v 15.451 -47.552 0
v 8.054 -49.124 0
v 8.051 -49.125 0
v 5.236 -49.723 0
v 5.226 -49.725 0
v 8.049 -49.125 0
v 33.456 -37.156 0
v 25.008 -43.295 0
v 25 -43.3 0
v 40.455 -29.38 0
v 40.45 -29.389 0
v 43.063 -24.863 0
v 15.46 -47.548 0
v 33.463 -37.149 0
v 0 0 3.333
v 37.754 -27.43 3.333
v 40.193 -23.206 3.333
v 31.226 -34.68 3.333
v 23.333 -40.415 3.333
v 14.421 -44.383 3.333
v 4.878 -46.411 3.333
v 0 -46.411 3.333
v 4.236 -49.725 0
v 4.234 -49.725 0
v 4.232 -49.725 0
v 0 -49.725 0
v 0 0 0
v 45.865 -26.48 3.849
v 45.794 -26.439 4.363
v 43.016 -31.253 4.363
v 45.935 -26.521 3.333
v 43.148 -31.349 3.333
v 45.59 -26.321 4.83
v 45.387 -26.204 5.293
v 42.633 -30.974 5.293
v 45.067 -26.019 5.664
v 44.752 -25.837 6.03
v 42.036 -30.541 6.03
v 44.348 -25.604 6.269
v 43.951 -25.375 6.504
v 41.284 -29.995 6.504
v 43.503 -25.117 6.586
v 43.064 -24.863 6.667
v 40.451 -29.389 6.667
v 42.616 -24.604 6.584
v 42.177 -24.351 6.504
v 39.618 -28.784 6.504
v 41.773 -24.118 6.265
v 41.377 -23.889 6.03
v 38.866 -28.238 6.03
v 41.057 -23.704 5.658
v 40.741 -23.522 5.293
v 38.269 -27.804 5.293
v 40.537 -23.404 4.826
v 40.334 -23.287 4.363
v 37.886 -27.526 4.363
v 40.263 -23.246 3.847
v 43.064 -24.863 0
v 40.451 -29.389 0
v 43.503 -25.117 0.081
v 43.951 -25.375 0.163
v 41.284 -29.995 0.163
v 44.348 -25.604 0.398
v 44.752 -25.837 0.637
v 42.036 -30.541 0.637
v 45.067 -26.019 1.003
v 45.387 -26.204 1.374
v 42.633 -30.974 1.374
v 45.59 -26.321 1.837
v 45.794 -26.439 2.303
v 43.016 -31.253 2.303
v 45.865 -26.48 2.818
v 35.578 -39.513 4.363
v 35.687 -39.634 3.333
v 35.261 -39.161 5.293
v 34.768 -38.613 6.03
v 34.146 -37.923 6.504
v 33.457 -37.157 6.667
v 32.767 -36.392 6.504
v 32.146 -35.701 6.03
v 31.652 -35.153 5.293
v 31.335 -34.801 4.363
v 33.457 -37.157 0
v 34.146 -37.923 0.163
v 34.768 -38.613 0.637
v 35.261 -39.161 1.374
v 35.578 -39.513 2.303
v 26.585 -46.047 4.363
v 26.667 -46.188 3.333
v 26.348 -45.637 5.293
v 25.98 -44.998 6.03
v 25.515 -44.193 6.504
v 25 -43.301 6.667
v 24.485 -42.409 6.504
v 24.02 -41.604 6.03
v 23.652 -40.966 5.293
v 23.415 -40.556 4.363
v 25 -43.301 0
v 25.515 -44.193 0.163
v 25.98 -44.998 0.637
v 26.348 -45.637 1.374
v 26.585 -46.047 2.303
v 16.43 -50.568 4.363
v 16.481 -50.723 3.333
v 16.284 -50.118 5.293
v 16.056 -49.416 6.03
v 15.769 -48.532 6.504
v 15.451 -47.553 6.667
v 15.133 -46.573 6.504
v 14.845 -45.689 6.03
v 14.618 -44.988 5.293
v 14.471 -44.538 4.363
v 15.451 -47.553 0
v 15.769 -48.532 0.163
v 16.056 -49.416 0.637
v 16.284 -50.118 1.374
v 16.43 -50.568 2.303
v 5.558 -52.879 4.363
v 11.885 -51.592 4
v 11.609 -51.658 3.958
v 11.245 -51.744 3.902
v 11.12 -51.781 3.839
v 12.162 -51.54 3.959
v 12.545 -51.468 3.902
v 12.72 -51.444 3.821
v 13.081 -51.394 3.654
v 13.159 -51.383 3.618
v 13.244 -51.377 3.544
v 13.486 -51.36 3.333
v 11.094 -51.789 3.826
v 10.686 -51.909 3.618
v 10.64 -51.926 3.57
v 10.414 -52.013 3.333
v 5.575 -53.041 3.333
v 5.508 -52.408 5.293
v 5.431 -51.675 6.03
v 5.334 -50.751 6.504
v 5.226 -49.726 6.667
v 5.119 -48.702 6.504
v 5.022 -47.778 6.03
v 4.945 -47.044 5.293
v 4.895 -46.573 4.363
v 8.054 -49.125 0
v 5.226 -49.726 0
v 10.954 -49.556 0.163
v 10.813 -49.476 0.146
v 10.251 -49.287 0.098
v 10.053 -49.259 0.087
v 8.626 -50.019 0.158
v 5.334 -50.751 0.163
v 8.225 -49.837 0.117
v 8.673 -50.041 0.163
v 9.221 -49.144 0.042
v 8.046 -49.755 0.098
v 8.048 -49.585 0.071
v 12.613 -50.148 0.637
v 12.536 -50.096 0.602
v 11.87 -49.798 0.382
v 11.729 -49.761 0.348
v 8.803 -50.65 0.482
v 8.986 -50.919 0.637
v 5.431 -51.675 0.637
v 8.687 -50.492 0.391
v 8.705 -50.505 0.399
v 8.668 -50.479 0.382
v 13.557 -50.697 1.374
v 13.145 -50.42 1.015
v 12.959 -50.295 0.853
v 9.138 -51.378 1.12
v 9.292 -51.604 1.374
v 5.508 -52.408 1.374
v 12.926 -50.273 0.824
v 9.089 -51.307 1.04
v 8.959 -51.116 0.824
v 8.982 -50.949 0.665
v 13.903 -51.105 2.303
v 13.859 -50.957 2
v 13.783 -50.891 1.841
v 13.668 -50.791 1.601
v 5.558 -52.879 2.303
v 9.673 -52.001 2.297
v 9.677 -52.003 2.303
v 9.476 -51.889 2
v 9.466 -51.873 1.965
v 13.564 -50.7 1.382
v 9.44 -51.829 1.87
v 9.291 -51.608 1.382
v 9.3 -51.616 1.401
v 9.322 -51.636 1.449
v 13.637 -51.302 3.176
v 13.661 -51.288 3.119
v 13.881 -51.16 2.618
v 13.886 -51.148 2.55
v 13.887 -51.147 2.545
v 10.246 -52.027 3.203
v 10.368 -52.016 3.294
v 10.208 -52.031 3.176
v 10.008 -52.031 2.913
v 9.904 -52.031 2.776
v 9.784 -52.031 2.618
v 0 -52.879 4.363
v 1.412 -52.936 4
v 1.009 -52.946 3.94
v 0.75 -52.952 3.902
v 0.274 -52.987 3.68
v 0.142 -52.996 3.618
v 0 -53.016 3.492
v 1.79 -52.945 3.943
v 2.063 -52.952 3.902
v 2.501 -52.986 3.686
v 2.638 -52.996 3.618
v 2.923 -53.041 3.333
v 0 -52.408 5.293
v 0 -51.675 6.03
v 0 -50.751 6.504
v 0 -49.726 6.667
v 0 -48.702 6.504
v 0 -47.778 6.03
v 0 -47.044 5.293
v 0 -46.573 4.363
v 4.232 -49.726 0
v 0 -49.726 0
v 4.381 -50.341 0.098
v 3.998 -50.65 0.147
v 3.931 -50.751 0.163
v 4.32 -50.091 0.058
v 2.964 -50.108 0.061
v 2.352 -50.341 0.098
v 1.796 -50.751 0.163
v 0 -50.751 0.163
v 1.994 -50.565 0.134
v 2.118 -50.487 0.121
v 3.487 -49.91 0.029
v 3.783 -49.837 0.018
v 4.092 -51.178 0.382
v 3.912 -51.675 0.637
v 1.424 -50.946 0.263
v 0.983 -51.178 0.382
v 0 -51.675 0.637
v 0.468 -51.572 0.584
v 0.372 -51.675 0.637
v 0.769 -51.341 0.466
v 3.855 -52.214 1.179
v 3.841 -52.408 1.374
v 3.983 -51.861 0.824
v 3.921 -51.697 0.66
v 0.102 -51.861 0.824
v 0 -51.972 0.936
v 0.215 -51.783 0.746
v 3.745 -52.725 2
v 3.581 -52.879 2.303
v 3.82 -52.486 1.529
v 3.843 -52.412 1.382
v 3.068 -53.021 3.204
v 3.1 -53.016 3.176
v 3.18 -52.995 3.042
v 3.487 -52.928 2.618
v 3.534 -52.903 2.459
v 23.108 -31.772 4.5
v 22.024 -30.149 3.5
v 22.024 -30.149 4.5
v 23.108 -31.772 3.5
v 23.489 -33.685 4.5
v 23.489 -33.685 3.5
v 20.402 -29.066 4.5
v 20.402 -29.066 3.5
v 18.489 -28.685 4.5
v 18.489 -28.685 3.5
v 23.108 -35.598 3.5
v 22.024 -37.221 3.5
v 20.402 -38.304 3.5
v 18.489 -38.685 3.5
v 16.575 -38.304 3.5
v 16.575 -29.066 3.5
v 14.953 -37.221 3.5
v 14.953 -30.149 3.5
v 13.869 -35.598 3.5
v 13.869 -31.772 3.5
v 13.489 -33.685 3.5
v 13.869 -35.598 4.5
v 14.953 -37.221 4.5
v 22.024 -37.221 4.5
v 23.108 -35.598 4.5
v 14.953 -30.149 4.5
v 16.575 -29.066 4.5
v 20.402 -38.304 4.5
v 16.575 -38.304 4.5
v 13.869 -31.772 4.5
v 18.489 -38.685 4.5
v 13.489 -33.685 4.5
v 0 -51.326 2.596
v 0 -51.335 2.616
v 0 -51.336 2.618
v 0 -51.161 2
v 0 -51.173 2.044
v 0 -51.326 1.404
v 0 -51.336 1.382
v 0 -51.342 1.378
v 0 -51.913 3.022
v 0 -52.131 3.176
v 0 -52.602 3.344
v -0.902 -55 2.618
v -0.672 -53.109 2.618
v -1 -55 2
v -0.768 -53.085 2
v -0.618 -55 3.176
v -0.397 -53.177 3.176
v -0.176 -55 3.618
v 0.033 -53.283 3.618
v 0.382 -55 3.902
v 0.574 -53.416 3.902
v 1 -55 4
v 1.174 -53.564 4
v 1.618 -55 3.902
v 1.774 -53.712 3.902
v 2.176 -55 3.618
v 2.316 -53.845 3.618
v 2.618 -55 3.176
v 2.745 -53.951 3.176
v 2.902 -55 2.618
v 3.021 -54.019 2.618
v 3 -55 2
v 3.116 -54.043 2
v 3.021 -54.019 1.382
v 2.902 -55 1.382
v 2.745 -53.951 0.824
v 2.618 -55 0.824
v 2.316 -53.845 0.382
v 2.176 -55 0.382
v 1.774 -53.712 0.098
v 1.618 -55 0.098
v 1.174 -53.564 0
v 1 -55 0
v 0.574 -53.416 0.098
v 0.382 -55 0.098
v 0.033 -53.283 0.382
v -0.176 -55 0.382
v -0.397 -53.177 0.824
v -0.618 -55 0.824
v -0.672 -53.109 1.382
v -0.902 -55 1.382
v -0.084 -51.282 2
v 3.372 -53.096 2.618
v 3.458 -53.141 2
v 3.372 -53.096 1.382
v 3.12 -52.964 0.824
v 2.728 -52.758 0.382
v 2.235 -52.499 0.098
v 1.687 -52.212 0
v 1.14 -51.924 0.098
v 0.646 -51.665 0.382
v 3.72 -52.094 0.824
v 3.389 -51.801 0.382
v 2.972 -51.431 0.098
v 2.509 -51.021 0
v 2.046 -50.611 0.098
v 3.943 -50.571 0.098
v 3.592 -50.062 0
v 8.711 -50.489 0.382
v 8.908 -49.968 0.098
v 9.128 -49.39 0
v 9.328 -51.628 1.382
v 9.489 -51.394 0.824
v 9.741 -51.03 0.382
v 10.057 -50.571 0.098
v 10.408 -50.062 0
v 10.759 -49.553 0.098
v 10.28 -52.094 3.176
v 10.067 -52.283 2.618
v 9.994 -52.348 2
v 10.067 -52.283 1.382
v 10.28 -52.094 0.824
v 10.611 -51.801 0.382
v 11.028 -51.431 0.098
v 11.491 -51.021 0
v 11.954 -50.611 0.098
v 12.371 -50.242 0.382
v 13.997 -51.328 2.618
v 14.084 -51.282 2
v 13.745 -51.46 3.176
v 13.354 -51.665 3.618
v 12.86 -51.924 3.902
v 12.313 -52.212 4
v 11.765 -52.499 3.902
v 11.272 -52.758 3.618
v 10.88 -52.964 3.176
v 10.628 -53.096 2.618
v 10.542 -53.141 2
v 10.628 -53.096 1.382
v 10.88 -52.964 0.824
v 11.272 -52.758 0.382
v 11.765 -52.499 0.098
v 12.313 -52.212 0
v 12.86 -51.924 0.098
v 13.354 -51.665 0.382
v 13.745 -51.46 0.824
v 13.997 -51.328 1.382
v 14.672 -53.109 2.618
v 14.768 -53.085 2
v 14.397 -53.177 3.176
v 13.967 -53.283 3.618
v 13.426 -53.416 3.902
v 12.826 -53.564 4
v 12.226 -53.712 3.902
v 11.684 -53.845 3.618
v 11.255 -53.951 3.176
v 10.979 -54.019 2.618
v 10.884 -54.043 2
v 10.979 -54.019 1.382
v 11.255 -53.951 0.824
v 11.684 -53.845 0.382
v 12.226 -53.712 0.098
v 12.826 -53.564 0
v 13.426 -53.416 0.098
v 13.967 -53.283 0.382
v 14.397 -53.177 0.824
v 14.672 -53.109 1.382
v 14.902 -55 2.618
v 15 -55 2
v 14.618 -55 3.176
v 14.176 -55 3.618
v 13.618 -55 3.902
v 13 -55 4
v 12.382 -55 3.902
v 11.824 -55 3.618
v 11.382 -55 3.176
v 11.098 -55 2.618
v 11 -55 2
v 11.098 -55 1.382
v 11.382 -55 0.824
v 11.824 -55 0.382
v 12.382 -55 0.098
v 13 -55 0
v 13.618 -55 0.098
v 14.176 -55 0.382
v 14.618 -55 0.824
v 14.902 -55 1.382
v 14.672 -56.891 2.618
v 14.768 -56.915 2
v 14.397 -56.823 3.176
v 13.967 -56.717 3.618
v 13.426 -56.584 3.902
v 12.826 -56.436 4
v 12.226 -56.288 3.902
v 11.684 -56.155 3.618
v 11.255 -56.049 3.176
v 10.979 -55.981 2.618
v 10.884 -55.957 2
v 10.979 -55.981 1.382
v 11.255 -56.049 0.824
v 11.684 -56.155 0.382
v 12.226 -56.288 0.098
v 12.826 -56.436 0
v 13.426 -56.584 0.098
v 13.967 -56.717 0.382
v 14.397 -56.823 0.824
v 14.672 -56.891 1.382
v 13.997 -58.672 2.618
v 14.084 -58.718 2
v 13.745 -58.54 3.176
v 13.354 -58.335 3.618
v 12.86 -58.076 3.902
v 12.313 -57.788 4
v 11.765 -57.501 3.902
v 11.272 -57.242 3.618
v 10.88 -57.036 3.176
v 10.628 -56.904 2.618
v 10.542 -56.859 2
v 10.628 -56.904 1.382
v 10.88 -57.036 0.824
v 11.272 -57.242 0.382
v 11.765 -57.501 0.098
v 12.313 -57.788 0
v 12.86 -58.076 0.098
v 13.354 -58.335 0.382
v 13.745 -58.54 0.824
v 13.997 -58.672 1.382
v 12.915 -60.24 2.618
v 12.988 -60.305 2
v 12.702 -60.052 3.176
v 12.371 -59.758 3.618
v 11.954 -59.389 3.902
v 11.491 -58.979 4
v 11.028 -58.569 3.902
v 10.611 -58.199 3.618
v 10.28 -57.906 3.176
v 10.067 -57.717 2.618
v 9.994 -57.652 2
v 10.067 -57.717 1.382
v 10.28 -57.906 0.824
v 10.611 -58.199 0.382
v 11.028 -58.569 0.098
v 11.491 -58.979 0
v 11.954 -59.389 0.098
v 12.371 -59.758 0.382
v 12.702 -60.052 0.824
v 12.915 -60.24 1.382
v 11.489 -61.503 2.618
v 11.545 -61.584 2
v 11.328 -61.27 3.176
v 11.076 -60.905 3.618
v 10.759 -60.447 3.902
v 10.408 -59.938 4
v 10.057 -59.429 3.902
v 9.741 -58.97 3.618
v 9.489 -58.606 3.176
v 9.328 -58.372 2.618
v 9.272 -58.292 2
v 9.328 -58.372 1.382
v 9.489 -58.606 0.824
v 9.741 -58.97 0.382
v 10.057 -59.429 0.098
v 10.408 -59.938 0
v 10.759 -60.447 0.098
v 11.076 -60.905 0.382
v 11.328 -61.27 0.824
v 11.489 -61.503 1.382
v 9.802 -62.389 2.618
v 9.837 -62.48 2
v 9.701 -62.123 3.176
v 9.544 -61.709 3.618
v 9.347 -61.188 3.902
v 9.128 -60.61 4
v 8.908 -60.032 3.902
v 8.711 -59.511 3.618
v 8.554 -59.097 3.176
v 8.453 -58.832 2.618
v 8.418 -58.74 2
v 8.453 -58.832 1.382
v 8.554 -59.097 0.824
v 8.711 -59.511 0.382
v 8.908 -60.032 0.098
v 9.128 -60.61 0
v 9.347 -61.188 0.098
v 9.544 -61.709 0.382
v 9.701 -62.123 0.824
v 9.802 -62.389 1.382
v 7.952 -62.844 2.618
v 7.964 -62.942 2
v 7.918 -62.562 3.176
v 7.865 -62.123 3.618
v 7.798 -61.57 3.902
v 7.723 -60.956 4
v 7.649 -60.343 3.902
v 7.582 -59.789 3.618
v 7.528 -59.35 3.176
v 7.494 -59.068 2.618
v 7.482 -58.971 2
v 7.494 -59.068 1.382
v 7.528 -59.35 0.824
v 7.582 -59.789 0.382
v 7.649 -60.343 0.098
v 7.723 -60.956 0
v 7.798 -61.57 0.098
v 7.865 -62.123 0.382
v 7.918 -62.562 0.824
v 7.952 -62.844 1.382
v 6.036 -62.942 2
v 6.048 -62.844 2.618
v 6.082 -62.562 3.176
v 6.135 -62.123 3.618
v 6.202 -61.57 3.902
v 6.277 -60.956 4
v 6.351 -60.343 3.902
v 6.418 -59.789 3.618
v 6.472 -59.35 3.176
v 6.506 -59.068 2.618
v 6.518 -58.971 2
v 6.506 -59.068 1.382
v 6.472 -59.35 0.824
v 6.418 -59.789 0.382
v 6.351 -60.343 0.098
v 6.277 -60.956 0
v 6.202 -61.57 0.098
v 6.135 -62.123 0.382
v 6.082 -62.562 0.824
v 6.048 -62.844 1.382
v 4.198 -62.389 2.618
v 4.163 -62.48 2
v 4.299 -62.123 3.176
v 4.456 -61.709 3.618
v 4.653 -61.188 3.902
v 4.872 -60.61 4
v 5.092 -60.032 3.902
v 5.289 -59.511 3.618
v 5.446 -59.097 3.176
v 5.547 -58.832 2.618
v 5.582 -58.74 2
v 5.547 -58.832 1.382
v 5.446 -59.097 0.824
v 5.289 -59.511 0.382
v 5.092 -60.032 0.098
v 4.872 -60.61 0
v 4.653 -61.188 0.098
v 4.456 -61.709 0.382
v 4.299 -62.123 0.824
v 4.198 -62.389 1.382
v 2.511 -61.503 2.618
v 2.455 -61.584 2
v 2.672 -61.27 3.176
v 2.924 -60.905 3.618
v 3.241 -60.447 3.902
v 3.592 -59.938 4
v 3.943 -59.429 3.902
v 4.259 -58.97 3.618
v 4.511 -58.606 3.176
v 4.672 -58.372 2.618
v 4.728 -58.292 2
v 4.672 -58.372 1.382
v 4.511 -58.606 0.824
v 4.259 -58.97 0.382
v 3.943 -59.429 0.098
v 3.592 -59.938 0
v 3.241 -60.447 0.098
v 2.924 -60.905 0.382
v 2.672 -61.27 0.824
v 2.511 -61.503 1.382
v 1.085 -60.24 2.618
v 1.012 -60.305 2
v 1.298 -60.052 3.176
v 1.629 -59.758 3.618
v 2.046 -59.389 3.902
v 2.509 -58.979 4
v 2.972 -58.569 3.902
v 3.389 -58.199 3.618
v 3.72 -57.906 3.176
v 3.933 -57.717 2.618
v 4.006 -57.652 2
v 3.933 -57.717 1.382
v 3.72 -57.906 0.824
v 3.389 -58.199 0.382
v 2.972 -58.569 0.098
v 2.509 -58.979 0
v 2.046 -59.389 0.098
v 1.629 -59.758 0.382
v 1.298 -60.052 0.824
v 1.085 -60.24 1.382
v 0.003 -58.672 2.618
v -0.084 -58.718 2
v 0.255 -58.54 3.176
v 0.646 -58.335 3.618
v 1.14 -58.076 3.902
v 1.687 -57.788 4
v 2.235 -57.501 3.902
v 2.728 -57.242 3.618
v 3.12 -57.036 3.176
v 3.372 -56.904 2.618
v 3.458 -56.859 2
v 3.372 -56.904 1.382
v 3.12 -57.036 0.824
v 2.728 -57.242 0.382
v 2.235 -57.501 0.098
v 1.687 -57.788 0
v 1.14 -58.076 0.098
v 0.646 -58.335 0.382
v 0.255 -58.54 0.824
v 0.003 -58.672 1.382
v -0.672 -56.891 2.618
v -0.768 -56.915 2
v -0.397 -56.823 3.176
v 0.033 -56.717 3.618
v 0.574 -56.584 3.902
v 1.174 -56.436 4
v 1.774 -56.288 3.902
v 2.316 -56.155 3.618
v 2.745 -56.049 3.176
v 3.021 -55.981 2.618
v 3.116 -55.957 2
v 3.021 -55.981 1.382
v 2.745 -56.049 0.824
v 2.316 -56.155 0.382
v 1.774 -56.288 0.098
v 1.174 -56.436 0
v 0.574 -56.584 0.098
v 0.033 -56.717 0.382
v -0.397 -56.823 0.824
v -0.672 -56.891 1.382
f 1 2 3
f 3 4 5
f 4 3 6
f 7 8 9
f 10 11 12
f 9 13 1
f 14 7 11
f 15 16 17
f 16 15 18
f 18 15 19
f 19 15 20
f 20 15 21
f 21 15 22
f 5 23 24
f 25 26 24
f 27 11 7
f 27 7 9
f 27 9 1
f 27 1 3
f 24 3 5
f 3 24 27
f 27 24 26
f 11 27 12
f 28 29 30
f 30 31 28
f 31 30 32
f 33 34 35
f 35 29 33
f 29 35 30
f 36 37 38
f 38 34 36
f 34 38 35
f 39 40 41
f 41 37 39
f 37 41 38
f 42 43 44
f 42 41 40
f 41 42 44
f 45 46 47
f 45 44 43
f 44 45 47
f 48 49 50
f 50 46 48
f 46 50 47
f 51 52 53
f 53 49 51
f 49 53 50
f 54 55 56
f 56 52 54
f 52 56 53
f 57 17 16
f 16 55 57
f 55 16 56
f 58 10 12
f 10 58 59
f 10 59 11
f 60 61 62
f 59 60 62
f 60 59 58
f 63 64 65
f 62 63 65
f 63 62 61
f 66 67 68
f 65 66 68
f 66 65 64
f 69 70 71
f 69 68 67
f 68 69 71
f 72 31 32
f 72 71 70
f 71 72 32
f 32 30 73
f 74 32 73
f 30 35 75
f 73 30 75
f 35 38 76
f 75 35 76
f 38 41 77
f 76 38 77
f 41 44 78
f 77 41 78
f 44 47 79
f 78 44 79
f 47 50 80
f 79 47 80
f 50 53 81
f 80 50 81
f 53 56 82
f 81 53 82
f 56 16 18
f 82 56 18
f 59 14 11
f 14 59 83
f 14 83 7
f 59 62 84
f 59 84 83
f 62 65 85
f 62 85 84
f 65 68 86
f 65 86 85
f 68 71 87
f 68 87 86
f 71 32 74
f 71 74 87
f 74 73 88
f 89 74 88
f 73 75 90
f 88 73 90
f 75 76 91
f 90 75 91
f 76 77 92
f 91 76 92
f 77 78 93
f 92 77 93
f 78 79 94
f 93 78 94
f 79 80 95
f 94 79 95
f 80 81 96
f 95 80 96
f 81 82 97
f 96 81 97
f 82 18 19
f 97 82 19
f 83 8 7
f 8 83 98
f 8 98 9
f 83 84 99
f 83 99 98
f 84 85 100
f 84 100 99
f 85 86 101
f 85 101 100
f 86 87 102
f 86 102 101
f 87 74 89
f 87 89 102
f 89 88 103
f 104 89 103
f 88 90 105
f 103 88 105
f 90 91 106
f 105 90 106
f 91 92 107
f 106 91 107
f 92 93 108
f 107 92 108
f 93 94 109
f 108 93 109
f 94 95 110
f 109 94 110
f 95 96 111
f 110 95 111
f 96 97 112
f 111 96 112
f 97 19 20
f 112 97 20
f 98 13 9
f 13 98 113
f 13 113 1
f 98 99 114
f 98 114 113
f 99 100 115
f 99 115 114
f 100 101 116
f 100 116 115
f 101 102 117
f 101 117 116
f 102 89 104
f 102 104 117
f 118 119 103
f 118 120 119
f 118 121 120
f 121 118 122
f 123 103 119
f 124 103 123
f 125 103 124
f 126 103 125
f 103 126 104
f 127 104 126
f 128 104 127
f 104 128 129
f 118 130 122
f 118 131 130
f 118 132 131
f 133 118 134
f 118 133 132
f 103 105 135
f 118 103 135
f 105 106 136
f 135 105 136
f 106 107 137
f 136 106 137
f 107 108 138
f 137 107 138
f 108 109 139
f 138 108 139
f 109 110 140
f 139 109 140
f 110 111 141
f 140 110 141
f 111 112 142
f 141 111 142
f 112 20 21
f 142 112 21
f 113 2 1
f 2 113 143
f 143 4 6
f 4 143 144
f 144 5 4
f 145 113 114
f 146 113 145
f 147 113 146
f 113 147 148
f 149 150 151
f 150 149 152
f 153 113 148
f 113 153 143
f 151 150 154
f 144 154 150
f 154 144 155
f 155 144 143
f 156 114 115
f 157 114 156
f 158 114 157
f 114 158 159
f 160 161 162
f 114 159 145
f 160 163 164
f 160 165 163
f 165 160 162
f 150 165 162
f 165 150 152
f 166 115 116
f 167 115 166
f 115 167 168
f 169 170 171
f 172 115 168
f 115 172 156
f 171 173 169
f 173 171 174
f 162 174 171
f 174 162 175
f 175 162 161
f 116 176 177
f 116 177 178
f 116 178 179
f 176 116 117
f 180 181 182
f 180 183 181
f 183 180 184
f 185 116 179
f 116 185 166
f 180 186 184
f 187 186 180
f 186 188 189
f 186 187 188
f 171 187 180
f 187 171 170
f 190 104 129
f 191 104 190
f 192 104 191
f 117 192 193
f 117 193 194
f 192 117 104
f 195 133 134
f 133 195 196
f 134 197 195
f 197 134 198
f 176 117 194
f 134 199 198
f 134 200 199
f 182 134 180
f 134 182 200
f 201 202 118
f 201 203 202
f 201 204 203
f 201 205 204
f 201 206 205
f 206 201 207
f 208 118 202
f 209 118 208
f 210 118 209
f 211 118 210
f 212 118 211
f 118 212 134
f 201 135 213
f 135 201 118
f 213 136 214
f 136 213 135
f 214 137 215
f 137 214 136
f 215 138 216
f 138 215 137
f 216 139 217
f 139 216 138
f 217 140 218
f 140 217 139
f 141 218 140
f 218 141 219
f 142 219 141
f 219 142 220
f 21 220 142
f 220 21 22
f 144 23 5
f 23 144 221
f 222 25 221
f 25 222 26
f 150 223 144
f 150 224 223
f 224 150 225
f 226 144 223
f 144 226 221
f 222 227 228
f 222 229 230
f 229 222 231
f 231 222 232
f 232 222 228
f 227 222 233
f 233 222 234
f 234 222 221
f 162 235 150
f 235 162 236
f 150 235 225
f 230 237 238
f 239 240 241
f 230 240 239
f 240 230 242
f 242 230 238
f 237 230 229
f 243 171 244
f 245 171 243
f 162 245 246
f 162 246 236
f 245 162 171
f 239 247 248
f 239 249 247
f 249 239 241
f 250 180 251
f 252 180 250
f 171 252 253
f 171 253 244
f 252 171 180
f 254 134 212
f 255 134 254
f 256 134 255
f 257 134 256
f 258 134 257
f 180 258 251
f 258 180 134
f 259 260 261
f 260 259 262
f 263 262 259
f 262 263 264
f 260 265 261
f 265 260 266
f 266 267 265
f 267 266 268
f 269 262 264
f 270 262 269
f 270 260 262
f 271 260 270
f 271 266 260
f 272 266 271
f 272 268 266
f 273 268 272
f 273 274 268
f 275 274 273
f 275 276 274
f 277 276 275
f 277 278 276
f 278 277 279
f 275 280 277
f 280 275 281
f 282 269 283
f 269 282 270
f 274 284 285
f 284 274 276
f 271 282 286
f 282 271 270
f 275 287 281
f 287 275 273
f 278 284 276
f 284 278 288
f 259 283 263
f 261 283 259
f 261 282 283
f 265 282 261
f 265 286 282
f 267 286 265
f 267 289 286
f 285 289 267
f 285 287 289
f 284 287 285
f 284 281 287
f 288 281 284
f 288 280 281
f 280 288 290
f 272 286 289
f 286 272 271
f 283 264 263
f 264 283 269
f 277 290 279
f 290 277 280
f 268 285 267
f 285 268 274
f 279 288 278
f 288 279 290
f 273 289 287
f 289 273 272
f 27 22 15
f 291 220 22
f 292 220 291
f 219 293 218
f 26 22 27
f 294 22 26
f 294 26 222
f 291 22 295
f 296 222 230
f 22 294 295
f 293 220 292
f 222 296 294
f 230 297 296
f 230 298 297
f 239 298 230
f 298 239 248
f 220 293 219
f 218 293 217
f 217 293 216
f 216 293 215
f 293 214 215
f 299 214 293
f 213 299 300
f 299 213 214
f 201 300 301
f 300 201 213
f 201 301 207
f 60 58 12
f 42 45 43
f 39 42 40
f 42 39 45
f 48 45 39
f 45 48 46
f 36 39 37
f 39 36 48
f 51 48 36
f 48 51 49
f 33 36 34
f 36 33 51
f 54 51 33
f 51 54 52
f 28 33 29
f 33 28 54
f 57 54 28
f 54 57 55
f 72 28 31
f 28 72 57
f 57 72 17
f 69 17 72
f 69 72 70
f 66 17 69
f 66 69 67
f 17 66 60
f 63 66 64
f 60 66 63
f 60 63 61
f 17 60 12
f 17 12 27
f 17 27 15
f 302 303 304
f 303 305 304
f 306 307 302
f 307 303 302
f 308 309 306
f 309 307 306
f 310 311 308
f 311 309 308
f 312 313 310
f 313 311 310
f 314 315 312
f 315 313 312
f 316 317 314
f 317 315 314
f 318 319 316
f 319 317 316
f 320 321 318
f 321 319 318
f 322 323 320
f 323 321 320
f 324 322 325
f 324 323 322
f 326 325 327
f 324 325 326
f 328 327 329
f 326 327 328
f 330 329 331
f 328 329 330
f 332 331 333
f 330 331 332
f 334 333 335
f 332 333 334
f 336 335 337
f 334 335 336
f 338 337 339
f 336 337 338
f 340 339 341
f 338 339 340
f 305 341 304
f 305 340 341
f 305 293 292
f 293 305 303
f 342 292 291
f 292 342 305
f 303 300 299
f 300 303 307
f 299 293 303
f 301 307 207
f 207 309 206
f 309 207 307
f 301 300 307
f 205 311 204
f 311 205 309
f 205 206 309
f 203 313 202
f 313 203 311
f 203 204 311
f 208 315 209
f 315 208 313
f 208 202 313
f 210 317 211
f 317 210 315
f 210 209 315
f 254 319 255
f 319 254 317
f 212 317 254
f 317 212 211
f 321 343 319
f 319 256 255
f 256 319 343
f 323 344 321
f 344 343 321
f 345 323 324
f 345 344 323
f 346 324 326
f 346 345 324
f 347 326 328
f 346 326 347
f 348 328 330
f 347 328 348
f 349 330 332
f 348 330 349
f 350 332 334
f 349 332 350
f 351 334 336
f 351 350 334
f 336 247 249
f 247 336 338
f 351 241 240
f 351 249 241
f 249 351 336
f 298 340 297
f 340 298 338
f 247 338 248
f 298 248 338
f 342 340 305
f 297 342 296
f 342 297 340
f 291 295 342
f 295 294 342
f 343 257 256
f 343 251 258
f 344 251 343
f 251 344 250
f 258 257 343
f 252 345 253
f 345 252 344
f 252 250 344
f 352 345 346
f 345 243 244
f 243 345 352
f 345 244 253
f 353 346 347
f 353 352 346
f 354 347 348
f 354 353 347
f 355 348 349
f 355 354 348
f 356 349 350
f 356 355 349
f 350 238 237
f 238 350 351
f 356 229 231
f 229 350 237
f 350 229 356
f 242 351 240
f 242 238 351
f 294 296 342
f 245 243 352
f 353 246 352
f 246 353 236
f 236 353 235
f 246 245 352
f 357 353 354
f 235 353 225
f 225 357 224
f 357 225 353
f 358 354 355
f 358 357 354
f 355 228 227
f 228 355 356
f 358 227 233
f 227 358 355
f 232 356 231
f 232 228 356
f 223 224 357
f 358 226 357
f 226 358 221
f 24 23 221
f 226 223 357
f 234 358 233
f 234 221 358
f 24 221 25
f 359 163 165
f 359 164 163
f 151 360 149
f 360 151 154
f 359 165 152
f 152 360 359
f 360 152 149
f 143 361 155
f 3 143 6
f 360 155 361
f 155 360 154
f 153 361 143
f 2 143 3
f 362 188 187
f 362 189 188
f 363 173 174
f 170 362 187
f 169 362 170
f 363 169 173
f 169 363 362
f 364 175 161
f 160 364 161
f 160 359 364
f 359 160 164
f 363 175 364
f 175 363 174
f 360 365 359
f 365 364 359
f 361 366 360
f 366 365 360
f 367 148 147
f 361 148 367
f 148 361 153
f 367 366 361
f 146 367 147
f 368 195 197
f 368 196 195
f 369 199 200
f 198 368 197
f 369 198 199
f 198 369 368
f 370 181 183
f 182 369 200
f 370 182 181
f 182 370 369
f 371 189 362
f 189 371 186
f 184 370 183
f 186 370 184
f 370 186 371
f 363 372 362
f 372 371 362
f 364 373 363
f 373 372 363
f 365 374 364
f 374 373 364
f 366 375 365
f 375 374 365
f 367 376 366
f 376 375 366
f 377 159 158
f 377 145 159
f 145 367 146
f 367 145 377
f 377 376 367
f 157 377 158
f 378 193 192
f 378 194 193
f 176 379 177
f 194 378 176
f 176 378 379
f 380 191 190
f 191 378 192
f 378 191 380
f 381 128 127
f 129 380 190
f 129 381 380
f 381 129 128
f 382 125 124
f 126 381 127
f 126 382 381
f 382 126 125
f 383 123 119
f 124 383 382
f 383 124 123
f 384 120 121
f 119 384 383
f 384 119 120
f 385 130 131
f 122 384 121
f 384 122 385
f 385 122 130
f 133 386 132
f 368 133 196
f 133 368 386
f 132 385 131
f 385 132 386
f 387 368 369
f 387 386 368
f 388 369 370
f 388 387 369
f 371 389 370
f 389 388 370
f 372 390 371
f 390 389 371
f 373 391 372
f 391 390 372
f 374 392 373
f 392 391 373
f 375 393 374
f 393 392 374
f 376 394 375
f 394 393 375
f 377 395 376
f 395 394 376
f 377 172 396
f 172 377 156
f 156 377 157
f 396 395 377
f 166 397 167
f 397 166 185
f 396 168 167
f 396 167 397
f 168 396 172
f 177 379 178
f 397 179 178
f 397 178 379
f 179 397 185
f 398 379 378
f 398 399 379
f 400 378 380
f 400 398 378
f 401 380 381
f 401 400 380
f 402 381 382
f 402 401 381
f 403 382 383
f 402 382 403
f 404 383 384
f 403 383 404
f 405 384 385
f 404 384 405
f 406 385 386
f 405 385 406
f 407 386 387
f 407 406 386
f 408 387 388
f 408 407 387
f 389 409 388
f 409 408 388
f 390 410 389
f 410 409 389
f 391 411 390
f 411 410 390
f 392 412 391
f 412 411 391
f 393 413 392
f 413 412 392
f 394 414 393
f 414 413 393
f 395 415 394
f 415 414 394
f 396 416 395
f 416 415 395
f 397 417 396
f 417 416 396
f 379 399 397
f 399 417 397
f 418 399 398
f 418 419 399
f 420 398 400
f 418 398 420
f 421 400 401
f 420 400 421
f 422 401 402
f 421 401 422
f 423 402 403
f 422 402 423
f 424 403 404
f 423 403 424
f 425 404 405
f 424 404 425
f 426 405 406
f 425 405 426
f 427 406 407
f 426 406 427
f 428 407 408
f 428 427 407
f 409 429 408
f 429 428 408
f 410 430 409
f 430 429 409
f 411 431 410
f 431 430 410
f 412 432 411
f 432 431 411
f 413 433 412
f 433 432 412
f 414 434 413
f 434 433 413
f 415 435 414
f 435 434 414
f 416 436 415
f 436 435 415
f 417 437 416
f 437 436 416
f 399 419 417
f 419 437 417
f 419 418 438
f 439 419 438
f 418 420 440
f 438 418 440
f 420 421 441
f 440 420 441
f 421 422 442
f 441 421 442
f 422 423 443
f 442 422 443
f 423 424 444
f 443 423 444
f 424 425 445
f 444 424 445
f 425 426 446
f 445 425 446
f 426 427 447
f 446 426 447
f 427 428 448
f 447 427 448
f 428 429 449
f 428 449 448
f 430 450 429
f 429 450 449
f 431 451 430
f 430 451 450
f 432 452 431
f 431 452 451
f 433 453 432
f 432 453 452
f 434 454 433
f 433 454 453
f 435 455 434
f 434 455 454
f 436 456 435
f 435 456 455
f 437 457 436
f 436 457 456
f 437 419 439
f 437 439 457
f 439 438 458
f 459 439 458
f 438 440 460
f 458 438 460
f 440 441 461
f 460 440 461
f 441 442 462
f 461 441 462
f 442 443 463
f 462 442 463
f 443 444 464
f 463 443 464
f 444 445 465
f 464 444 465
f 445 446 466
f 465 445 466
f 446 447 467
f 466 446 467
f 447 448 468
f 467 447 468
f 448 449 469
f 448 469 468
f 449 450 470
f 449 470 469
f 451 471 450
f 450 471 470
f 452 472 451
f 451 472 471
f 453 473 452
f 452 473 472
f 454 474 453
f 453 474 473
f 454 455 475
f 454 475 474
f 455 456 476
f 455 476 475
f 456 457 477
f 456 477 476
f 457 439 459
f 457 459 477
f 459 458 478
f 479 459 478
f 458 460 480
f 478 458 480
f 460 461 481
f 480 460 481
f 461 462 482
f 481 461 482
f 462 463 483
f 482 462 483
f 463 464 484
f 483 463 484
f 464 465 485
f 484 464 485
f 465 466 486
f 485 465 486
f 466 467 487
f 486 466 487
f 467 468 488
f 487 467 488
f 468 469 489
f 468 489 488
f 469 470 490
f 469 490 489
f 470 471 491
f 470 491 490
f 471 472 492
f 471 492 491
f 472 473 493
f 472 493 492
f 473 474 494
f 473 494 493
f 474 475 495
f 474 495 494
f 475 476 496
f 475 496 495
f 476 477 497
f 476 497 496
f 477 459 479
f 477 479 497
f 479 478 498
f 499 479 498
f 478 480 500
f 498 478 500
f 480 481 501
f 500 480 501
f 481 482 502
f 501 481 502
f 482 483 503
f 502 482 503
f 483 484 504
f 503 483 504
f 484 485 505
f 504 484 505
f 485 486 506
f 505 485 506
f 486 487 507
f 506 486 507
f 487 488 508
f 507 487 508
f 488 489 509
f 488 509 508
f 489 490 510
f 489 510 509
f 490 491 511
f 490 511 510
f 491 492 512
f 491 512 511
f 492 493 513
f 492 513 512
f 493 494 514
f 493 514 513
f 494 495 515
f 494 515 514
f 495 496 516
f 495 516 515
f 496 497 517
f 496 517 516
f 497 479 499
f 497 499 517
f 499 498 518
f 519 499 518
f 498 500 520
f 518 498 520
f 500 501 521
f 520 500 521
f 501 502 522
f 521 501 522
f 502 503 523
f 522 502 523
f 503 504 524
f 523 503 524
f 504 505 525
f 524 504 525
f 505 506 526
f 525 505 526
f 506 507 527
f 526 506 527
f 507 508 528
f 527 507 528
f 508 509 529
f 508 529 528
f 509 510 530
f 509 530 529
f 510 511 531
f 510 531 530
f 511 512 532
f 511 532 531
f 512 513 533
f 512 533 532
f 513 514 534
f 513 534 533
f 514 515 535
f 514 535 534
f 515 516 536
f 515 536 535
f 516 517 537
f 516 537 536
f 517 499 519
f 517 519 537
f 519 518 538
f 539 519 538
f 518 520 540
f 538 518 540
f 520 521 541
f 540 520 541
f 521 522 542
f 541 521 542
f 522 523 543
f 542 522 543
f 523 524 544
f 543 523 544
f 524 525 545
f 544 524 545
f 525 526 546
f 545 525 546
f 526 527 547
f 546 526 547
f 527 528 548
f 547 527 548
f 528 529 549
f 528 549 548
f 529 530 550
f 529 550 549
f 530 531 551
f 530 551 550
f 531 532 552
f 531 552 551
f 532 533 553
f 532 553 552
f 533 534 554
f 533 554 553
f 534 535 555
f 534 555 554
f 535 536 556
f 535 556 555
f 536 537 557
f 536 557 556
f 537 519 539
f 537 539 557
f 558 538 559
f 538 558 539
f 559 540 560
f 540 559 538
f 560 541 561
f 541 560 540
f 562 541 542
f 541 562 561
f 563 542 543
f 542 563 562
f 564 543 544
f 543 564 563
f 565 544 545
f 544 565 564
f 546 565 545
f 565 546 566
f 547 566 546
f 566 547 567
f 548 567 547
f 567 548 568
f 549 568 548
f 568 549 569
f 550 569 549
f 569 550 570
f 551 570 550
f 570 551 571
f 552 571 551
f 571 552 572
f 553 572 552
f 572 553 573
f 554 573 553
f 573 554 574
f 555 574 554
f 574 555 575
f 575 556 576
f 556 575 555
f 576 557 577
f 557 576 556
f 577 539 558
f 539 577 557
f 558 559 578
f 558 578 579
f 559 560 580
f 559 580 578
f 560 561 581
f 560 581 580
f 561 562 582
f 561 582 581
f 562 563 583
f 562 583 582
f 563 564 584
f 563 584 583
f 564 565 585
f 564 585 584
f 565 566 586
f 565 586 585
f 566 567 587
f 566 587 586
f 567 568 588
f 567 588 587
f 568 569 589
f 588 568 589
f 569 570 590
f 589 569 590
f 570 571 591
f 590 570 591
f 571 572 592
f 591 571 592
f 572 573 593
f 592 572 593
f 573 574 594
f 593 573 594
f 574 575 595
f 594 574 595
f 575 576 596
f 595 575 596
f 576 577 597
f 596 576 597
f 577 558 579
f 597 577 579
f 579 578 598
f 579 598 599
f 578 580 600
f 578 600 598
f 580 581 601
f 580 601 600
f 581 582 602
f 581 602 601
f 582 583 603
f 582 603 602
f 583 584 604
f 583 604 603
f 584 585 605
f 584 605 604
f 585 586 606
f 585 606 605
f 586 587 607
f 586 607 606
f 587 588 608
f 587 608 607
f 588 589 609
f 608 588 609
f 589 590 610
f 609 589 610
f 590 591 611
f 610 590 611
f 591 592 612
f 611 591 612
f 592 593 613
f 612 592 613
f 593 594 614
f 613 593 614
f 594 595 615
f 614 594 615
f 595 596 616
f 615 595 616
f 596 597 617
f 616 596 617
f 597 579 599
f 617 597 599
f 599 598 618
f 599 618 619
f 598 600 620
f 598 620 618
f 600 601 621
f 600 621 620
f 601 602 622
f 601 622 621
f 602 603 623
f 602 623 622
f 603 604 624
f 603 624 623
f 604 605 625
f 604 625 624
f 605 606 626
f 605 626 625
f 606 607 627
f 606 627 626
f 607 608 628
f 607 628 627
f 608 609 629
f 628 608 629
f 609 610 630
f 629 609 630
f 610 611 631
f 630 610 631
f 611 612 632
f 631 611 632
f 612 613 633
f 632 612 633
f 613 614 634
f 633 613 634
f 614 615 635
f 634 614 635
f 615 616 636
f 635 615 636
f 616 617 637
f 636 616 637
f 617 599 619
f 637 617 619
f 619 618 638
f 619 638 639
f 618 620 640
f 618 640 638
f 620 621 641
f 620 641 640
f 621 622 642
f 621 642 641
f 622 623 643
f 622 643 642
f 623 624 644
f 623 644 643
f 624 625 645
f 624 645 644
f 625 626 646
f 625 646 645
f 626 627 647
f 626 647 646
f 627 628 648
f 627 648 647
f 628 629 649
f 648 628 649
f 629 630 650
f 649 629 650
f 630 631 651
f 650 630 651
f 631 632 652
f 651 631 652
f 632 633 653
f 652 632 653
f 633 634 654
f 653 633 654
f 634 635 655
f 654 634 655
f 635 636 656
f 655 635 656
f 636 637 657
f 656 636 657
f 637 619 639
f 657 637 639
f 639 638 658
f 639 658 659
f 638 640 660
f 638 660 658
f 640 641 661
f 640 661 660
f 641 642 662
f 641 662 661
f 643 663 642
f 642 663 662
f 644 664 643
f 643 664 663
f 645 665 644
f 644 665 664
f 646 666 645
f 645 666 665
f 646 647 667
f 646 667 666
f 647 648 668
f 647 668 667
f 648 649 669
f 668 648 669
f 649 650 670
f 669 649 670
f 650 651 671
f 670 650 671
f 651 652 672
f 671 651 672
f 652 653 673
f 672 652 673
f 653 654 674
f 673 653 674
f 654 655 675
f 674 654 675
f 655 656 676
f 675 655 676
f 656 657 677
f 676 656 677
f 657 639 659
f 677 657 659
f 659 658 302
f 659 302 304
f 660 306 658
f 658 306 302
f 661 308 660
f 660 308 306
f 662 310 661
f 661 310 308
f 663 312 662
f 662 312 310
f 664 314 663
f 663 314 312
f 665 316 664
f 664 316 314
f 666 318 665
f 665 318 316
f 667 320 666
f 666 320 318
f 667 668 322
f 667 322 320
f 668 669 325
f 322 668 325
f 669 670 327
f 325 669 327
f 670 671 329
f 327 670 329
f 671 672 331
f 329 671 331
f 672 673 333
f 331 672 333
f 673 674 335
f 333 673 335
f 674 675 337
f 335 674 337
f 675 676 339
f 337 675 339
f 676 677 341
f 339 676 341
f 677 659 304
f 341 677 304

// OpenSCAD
//Pizza pendant
//by Ming-Dao Chia

crust_thickness=5;
pizza_diameter=100;
overlap=0.001;
circle_res = 20;
pepperoni=15;
slice_angle=60;
random_seed=70;

module torus(radius, thickness){
    rotate_extrude(convexity = 10)
    translate([radius,0,0])
    circle(r = thickness, $fn=circle_res);
}

module pizza_base(){
    union(){
        cylinder(r=(pizza_diameter/2)-overlap,h=crust_thickness/1.5);
        translate([0,0,crust_thickness/1.5])
        torus(pizza_diameter/2, crust_thickness/1.5);
    }
}

module pepperoni(){
    cylinder(r=pizza_diameter/20, h=crust_thickness/5);
}

module pepperoni_spread(amount){
    translate([0,0,crust_thickness/2+crust_thickness/5])
    union(){
        for(i=[1:amount]){
            coords=rands(-pizza_diameter/2,pizza_diameter/2,2,i+random_seed*2);
            translate([coords[0], coords[1], 0])
            pepperoni();
        }
    }
}

module pepperoni_clean(){
    difference(){
        pepperoni_spread(pepperoni);
        translate([0,0,-1])
        difference(){
            cylinder(r=(pizza_diameter)-overlap,h=crust_thickness*2, $fn=circle_res);
            translate([0,0,-1])
            cylinder(r=(pizza_diameter/2),h=crust_thickness*3);
        }
    }
}

module pizza_cutter(angle){
    translate([0,0,-1])
    linear_extrude(height=crust_thickness*2){
    rotate(angle-90) square(pizza_diameter/2+crust_thickness);
    rotate(180) square(pizza_diameter/2+crust_thickness);
    rotate(90) square(pizza_diameter/2+crust_thickness);
        square(pizza_diameter/2+crust_thickness);
    }
}

module pizza(){
    union(){
        pizza_base();
        pepperoni_clean();
    }
}

module pizza_slice(){
    difference(){
        pizza();
        pizza_cutter(slice_angle);
    }
}

module pizza_necklace(){
    union(){
        translate([7,-55,2])
        torus(6,2);
        pizza_slice();
    }
}

pizza_necklace();
